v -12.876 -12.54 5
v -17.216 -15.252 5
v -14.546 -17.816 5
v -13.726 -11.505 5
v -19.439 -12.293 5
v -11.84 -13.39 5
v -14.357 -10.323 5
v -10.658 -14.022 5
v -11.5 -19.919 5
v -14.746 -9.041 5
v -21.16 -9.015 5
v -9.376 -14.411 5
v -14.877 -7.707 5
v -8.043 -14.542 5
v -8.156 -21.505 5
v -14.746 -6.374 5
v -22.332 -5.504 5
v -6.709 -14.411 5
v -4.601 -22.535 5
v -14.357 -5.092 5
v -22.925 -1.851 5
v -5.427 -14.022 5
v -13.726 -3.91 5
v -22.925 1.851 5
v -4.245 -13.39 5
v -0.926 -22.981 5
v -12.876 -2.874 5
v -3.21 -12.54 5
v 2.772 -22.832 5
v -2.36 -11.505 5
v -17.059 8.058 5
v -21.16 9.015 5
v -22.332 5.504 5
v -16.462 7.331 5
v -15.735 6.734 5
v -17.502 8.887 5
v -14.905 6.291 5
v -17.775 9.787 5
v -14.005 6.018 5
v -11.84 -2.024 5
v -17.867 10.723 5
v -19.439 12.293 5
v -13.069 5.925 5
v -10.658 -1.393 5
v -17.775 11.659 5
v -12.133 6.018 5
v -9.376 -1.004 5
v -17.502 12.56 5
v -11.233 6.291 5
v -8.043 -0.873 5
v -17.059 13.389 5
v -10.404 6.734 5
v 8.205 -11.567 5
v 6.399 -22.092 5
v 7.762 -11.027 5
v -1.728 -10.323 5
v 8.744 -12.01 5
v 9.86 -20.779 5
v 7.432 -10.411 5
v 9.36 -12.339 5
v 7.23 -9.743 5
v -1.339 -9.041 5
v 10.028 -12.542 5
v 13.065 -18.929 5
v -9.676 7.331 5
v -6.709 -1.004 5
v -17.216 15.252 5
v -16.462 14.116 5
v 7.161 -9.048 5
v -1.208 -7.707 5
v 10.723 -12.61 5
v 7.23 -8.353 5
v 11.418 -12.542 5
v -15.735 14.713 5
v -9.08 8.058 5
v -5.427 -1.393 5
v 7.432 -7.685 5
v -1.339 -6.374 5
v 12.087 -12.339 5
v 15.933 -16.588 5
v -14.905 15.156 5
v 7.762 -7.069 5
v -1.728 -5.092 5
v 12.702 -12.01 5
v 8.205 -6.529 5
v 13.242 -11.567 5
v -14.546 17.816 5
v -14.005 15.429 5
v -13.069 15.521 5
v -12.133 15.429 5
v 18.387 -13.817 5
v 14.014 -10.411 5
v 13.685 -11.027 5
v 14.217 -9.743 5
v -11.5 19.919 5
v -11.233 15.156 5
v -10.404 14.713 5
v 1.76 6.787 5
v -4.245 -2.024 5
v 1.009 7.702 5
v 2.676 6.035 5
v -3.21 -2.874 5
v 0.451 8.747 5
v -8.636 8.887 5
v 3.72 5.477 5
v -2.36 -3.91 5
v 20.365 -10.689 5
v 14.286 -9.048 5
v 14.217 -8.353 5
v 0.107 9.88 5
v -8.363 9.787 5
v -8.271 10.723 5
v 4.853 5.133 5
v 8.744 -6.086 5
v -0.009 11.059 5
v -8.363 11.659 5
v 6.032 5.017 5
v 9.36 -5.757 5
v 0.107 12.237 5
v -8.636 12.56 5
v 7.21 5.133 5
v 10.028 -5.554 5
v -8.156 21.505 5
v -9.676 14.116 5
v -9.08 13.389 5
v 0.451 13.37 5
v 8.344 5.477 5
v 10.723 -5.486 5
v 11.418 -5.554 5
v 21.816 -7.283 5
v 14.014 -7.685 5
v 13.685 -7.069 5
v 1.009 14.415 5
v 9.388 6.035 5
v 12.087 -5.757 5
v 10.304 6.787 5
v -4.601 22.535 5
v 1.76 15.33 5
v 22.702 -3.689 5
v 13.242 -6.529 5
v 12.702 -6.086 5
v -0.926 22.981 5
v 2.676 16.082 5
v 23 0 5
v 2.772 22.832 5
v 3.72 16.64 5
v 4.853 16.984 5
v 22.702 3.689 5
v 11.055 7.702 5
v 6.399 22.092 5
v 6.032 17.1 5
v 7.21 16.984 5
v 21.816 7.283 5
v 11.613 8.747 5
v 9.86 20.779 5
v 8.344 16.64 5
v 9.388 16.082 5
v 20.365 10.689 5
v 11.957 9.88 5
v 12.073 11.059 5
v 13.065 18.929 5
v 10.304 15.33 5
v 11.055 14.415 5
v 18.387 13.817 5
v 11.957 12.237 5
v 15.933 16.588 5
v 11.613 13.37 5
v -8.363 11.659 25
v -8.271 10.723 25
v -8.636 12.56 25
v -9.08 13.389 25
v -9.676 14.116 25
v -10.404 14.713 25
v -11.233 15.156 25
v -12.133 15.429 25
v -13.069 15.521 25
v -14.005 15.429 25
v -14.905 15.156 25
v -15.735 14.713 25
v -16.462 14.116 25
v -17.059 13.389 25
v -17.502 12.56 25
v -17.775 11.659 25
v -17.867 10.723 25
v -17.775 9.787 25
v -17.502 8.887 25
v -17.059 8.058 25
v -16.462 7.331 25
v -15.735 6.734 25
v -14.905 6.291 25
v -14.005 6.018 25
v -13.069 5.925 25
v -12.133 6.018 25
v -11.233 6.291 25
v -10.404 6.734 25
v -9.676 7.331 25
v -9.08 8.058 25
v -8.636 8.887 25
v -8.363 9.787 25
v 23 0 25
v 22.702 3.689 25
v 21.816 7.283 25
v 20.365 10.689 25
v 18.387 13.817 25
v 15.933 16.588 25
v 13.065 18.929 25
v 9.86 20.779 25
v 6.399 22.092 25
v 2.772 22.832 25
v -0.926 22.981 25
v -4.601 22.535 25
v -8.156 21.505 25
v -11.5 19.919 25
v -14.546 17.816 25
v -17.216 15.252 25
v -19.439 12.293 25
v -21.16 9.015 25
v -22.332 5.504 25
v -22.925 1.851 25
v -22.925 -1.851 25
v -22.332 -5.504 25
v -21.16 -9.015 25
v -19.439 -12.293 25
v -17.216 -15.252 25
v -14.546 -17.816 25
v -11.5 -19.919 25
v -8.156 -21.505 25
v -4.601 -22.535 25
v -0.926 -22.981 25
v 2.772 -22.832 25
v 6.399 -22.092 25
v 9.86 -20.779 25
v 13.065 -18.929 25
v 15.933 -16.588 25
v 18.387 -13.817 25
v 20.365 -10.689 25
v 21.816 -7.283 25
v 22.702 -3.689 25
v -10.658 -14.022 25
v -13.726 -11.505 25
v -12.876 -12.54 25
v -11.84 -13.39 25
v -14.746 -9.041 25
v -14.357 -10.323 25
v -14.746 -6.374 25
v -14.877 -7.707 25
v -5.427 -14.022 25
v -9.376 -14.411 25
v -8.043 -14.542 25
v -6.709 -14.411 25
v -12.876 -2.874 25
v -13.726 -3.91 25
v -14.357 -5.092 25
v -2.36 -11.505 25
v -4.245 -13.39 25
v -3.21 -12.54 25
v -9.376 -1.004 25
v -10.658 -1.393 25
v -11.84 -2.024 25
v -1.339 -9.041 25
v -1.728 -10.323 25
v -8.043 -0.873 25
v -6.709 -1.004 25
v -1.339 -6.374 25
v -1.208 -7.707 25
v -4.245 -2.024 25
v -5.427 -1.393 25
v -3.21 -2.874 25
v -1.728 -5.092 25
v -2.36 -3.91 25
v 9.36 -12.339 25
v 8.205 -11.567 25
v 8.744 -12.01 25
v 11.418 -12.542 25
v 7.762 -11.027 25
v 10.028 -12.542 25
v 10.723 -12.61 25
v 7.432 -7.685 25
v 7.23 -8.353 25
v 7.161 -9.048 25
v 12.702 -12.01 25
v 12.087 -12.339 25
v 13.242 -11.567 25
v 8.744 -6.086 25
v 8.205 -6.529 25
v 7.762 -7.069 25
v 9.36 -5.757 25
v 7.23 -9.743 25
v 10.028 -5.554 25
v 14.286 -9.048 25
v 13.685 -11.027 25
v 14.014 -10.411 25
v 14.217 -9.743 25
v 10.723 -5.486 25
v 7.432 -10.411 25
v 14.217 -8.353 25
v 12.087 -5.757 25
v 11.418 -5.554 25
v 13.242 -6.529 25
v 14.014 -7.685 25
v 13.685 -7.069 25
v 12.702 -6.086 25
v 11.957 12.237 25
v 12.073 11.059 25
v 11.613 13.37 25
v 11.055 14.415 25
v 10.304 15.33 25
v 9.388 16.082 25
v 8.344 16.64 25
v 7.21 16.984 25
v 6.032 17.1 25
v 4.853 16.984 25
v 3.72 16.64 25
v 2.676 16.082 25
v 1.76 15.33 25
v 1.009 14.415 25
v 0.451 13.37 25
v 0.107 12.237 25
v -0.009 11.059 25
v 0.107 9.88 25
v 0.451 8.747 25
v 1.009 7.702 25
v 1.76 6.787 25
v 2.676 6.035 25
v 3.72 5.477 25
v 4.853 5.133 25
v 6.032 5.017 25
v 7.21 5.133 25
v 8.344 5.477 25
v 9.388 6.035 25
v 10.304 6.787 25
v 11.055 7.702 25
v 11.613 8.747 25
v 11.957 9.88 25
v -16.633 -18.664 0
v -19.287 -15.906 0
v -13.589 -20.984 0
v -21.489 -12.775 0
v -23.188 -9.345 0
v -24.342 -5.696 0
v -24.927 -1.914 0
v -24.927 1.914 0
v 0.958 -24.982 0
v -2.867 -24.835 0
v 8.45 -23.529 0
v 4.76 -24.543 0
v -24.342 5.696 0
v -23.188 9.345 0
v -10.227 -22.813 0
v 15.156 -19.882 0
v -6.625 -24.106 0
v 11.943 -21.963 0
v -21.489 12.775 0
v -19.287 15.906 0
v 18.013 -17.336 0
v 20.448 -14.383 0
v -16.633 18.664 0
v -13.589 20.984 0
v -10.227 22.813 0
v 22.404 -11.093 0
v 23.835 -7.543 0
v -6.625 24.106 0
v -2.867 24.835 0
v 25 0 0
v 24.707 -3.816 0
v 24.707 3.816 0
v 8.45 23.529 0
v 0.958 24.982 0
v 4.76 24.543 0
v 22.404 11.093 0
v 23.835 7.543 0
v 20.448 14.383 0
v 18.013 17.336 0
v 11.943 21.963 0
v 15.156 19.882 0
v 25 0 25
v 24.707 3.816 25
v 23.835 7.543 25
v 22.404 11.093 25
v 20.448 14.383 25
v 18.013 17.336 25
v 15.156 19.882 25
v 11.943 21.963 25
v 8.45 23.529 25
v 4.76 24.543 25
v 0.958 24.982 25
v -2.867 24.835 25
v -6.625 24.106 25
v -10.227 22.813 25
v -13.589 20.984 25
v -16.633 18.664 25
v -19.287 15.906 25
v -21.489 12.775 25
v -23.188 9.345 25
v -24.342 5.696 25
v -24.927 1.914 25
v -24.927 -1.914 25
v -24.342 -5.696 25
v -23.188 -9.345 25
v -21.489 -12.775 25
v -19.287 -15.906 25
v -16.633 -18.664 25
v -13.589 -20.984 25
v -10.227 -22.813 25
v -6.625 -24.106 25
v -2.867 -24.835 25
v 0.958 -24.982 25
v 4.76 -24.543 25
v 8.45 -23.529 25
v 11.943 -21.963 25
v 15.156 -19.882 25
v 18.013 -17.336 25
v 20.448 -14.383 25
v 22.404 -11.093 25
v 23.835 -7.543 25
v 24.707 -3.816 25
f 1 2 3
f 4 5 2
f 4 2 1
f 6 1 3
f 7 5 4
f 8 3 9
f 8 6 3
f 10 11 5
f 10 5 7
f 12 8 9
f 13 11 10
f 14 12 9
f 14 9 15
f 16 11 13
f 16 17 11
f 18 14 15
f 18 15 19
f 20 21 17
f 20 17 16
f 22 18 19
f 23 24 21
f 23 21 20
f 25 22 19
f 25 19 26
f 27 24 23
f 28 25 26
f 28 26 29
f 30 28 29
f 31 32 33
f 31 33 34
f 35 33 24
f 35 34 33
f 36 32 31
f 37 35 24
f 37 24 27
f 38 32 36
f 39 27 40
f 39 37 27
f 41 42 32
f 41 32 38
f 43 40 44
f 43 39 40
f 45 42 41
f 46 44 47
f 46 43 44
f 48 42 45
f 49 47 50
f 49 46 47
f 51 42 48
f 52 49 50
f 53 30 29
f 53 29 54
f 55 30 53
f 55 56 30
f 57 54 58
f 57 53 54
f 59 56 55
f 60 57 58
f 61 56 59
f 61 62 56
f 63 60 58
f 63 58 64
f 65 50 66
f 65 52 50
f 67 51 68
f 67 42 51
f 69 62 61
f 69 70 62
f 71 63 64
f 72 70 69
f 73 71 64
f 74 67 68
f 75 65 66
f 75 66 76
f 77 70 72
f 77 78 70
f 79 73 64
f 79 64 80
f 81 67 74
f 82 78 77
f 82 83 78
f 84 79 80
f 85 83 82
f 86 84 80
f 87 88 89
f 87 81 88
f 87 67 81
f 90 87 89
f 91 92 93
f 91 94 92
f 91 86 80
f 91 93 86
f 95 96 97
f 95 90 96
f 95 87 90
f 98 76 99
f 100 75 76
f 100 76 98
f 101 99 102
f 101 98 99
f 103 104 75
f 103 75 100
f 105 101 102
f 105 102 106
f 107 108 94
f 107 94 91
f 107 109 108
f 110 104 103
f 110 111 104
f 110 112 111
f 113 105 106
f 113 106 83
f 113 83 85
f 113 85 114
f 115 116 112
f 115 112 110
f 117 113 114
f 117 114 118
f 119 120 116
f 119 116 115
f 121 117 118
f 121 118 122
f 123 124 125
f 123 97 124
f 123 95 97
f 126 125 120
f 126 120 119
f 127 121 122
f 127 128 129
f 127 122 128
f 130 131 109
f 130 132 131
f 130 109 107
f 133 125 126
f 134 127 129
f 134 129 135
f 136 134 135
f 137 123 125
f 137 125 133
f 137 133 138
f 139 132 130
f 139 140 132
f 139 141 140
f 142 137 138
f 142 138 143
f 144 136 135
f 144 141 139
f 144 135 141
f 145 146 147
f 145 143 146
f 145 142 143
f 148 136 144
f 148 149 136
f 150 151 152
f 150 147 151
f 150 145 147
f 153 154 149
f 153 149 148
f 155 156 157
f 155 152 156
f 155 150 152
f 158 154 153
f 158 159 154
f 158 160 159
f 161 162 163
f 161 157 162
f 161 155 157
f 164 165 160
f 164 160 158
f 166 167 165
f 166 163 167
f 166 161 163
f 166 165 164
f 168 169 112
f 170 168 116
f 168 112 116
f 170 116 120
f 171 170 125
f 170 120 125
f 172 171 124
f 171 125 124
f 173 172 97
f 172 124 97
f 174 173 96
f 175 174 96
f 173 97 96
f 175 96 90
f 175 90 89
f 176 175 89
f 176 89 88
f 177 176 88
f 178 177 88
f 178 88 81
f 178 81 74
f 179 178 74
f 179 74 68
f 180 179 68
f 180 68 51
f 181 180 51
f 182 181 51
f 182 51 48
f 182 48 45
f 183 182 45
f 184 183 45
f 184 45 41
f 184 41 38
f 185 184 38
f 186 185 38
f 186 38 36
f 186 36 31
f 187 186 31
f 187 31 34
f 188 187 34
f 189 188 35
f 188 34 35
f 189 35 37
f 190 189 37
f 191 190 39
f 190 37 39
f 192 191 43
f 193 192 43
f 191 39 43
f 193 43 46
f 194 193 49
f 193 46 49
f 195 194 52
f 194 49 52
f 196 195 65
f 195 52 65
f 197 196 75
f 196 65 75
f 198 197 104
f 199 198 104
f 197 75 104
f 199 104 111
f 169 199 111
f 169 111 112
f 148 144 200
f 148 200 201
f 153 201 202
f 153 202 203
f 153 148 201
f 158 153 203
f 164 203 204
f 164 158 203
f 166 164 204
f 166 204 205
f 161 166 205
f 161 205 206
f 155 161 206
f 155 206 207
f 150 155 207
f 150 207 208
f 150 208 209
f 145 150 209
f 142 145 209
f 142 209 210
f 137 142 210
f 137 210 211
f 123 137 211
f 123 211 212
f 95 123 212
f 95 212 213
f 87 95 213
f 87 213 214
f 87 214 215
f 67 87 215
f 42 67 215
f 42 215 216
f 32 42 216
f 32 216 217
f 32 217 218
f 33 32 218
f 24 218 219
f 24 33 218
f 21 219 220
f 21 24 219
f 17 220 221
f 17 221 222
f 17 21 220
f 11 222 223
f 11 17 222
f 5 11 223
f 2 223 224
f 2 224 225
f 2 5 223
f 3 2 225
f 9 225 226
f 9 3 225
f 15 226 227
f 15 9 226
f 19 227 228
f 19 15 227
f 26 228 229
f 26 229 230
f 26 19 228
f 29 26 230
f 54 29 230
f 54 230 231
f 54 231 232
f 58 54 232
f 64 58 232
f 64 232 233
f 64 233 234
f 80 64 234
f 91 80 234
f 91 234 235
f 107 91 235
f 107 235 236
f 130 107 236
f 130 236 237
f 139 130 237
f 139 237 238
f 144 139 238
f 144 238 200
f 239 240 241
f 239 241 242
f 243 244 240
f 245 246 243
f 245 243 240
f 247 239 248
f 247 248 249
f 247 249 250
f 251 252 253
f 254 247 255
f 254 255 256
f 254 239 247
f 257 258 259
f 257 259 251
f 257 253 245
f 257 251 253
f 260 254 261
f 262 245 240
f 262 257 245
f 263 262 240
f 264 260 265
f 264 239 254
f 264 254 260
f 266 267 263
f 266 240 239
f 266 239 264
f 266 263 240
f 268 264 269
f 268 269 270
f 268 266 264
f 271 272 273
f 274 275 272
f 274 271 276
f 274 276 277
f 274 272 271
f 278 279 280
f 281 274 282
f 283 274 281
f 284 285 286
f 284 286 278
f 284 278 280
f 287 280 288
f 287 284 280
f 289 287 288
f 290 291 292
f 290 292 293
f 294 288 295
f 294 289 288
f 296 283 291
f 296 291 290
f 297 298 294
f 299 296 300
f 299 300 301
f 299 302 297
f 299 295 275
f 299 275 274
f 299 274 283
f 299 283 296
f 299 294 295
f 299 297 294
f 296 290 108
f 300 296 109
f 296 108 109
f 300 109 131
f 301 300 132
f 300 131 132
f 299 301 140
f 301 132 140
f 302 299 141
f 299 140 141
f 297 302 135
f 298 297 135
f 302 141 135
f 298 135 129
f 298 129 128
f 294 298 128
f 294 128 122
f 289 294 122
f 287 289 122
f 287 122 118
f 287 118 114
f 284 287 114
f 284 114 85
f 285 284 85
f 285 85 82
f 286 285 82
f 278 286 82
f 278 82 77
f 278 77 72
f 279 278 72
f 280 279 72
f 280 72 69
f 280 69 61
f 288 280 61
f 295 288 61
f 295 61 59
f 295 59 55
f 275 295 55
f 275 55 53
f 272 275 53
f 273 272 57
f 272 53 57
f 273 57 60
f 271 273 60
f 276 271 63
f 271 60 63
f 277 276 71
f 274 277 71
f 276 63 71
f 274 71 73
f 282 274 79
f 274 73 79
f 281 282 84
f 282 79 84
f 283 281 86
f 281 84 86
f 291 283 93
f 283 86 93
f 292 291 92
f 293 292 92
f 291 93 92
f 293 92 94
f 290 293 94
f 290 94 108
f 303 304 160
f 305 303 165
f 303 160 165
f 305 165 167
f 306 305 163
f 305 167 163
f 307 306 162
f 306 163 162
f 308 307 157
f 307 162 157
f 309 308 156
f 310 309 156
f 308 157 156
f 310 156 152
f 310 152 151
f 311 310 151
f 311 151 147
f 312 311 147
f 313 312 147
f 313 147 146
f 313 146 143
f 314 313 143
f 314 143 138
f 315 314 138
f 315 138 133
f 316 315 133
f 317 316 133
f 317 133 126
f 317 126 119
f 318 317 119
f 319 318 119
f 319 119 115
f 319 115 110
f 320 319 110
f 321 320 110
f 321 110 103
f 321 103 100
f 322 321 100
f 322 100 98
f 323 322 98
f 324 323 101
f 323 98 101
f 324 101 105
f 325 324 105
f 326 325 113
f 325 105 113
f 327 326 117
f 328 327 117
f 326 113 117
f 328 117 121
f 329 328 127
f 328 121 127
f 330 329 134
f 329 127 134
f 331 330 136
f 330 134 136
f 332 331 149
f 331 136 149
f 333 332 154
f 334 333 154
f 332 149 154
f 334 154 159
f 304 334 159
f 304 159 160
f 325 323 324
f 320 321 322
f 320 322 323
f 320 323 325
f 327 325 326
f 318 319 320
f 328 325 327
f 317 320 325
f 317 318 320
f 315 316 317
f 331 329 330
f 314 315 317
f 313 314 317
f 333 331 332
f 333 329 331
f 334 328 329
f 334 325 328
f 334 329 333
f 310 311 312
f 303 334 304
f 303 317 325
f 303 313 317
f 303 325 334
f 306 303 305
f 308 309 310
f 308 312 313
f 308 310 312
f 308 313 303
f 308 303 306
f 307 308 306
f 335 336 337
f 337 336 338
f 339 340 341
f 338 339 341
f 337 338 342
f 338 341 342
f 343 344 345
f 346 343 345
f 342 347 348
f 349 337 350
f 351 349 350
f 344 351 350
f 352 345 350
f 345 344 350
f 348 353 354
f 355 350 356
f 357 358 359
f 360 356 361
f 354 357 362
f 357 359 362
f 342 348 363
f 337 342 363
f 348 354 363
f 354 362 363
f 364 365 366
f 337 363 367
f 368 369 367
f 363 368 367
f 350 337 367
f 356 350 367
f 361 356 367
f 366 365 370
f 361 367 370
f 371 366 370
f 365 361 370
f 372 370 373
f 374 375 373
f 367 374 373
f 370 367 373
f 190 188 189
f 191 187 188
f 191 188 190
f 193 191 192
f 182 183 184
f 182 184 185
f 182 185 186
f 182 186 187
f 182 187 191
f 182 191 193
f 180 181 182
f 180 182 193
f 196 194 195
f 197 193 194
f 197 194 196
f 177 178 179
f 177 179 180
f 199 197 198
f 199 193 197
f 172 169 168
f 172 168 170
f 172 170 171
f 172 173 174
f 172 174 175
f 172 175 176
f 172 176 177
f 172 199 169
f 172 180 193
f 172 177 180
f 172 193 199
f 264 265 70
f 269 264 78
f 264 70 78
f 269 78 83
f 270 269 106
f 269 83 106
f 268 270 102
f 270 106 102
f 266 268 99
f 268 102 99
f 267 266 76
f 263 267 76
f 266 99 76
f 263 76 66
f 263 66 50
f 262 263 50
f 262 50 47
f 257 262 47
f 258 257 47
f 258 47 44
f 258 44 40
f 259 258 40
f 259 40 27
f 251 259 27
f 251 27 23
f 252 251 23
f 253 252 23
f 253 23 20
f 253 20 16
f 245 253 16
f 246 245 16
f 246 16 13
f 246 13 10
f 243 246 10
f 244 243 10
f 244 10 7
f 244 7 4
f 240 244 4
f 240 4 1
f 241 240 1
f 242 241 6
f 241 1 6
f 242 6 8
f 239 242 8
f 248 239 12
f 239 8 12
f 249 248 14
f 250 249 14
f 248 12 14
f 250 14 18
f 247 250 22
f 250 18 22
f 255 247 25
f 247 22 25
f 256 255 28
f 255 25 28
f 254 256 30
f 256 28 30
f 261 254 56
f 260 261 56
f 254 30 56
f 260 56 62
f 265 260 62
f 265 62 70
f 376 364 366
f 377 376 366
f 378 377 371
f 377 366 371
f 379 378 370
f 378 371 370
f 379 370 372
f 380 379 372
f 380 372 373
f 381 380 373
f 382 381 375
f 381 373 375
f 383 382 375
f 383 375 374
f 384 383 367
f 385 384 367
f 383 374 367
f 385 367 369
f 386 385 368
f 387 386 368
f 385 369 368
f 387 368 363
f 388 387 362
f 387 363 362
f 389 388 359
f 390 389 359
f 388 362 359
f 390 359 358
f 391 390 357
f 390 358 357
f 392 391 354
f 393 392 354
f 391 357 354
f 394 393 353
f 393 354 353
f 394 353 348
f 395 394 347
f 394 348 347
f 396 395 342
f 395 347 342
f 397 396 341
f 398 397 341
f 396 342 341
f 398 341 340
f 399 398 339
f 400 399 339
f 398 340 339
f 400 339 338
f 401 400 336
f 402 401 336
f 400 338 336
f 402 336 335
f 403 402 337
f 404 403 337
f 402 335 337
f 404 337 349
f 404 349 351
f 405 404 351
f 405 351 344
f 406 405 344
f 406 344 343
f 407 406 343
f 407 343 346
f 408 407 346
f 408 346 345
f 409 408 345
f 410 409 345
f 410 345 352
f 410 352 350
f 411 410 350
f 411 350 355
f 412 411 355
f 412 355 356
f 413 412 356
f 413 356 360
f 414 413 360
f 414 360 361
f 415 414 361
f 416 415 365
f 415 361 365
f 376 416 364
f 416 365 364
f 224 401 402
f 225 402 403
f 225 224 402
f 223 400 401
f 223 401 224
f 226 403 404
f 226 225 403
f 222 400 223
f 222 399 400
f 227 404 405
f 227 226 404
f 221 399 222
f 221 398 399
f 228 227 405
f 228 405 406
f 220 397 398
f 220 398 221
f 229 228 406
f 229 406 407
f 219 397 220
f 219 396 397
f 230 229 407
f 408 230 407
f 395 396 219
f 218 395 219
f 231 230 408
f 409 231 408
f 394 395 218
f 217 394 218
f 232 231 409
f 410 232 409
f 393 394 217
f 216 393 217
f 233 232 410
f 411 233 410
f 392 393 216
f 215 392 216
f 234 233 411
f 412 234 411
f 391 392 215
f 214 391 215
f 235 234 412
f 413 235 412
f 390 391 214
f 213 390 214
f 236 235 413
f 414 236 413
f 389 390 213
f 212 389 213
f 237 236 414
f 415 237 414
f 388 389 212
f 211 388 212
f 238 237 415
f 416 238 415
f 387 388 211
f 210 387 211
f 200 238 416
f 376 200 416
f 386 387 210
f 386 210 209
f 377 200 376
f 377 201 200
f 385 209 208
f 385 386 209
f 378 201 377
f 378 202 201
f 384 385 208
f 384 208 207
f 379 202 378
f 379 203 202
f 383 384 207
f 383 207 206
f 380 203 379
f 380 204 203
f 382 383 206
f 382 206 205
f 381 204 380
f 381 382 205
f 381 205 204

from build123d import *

# Parameters (mm, degrees)
F0_R     = 25
F0_R_2   = 23
F1_DEPTH = 25
F0_R_3   = 6.834856
F0_R_4   = 3.562232
F0_R_5   = 4.797994
F0_R_6   = 6.041215
F2_DEPTH = 5
F3_DEPTH = 25


with BuildPart() as f1:
    # F0 (on Top) → F1 (new body)
    with BuildSketch(Plane.XY):
        Circle(F0_R)
        Circle(F0_R_2, mode=Mode.SUBTRACT)
    extrude(amount=F1_DEPTH)

    # F0 (on Top) → F2 (join)
    with BuildSketch(Plane.XY):
        Circle(F0_R_2)
        with Locations((-8.042553, -7.707447)):
            Circle(F0_R_3, mode=Mode.SUBTRACT)
        with Locations((10.723404, -9.047872)):
            Circle(F0_R_4, mode=Mode.SUBTRACT)
        with Locations((-13.06915, 10.723405)):
            Circle(F0_R_5, mode=Mode.SUBTRACT)
        with Locations((6.031916, 11.058511)):
            Circle(F0_R_6, mode=Mode.SUBTRACT)
    extrude(amount=F2_DEPTH)

    # F0 (on Top) → F3 (join)
    with BuildSketch(Plane.XY):
        with Locations((-8.042553, -7.707447)):
            Circle(F0_R_3)
        with Locations((6.031916, 11.058511)):
            Circle(F0_R_6)
        with Locations((-13.06915, 10.723405)):
            Circle(F0_R_5)
        with Locations((10.723404, -9.047872)):
            Circle(F0_R_4)
    extrude(amount=F3_DEPTH)


solid = f1.part
